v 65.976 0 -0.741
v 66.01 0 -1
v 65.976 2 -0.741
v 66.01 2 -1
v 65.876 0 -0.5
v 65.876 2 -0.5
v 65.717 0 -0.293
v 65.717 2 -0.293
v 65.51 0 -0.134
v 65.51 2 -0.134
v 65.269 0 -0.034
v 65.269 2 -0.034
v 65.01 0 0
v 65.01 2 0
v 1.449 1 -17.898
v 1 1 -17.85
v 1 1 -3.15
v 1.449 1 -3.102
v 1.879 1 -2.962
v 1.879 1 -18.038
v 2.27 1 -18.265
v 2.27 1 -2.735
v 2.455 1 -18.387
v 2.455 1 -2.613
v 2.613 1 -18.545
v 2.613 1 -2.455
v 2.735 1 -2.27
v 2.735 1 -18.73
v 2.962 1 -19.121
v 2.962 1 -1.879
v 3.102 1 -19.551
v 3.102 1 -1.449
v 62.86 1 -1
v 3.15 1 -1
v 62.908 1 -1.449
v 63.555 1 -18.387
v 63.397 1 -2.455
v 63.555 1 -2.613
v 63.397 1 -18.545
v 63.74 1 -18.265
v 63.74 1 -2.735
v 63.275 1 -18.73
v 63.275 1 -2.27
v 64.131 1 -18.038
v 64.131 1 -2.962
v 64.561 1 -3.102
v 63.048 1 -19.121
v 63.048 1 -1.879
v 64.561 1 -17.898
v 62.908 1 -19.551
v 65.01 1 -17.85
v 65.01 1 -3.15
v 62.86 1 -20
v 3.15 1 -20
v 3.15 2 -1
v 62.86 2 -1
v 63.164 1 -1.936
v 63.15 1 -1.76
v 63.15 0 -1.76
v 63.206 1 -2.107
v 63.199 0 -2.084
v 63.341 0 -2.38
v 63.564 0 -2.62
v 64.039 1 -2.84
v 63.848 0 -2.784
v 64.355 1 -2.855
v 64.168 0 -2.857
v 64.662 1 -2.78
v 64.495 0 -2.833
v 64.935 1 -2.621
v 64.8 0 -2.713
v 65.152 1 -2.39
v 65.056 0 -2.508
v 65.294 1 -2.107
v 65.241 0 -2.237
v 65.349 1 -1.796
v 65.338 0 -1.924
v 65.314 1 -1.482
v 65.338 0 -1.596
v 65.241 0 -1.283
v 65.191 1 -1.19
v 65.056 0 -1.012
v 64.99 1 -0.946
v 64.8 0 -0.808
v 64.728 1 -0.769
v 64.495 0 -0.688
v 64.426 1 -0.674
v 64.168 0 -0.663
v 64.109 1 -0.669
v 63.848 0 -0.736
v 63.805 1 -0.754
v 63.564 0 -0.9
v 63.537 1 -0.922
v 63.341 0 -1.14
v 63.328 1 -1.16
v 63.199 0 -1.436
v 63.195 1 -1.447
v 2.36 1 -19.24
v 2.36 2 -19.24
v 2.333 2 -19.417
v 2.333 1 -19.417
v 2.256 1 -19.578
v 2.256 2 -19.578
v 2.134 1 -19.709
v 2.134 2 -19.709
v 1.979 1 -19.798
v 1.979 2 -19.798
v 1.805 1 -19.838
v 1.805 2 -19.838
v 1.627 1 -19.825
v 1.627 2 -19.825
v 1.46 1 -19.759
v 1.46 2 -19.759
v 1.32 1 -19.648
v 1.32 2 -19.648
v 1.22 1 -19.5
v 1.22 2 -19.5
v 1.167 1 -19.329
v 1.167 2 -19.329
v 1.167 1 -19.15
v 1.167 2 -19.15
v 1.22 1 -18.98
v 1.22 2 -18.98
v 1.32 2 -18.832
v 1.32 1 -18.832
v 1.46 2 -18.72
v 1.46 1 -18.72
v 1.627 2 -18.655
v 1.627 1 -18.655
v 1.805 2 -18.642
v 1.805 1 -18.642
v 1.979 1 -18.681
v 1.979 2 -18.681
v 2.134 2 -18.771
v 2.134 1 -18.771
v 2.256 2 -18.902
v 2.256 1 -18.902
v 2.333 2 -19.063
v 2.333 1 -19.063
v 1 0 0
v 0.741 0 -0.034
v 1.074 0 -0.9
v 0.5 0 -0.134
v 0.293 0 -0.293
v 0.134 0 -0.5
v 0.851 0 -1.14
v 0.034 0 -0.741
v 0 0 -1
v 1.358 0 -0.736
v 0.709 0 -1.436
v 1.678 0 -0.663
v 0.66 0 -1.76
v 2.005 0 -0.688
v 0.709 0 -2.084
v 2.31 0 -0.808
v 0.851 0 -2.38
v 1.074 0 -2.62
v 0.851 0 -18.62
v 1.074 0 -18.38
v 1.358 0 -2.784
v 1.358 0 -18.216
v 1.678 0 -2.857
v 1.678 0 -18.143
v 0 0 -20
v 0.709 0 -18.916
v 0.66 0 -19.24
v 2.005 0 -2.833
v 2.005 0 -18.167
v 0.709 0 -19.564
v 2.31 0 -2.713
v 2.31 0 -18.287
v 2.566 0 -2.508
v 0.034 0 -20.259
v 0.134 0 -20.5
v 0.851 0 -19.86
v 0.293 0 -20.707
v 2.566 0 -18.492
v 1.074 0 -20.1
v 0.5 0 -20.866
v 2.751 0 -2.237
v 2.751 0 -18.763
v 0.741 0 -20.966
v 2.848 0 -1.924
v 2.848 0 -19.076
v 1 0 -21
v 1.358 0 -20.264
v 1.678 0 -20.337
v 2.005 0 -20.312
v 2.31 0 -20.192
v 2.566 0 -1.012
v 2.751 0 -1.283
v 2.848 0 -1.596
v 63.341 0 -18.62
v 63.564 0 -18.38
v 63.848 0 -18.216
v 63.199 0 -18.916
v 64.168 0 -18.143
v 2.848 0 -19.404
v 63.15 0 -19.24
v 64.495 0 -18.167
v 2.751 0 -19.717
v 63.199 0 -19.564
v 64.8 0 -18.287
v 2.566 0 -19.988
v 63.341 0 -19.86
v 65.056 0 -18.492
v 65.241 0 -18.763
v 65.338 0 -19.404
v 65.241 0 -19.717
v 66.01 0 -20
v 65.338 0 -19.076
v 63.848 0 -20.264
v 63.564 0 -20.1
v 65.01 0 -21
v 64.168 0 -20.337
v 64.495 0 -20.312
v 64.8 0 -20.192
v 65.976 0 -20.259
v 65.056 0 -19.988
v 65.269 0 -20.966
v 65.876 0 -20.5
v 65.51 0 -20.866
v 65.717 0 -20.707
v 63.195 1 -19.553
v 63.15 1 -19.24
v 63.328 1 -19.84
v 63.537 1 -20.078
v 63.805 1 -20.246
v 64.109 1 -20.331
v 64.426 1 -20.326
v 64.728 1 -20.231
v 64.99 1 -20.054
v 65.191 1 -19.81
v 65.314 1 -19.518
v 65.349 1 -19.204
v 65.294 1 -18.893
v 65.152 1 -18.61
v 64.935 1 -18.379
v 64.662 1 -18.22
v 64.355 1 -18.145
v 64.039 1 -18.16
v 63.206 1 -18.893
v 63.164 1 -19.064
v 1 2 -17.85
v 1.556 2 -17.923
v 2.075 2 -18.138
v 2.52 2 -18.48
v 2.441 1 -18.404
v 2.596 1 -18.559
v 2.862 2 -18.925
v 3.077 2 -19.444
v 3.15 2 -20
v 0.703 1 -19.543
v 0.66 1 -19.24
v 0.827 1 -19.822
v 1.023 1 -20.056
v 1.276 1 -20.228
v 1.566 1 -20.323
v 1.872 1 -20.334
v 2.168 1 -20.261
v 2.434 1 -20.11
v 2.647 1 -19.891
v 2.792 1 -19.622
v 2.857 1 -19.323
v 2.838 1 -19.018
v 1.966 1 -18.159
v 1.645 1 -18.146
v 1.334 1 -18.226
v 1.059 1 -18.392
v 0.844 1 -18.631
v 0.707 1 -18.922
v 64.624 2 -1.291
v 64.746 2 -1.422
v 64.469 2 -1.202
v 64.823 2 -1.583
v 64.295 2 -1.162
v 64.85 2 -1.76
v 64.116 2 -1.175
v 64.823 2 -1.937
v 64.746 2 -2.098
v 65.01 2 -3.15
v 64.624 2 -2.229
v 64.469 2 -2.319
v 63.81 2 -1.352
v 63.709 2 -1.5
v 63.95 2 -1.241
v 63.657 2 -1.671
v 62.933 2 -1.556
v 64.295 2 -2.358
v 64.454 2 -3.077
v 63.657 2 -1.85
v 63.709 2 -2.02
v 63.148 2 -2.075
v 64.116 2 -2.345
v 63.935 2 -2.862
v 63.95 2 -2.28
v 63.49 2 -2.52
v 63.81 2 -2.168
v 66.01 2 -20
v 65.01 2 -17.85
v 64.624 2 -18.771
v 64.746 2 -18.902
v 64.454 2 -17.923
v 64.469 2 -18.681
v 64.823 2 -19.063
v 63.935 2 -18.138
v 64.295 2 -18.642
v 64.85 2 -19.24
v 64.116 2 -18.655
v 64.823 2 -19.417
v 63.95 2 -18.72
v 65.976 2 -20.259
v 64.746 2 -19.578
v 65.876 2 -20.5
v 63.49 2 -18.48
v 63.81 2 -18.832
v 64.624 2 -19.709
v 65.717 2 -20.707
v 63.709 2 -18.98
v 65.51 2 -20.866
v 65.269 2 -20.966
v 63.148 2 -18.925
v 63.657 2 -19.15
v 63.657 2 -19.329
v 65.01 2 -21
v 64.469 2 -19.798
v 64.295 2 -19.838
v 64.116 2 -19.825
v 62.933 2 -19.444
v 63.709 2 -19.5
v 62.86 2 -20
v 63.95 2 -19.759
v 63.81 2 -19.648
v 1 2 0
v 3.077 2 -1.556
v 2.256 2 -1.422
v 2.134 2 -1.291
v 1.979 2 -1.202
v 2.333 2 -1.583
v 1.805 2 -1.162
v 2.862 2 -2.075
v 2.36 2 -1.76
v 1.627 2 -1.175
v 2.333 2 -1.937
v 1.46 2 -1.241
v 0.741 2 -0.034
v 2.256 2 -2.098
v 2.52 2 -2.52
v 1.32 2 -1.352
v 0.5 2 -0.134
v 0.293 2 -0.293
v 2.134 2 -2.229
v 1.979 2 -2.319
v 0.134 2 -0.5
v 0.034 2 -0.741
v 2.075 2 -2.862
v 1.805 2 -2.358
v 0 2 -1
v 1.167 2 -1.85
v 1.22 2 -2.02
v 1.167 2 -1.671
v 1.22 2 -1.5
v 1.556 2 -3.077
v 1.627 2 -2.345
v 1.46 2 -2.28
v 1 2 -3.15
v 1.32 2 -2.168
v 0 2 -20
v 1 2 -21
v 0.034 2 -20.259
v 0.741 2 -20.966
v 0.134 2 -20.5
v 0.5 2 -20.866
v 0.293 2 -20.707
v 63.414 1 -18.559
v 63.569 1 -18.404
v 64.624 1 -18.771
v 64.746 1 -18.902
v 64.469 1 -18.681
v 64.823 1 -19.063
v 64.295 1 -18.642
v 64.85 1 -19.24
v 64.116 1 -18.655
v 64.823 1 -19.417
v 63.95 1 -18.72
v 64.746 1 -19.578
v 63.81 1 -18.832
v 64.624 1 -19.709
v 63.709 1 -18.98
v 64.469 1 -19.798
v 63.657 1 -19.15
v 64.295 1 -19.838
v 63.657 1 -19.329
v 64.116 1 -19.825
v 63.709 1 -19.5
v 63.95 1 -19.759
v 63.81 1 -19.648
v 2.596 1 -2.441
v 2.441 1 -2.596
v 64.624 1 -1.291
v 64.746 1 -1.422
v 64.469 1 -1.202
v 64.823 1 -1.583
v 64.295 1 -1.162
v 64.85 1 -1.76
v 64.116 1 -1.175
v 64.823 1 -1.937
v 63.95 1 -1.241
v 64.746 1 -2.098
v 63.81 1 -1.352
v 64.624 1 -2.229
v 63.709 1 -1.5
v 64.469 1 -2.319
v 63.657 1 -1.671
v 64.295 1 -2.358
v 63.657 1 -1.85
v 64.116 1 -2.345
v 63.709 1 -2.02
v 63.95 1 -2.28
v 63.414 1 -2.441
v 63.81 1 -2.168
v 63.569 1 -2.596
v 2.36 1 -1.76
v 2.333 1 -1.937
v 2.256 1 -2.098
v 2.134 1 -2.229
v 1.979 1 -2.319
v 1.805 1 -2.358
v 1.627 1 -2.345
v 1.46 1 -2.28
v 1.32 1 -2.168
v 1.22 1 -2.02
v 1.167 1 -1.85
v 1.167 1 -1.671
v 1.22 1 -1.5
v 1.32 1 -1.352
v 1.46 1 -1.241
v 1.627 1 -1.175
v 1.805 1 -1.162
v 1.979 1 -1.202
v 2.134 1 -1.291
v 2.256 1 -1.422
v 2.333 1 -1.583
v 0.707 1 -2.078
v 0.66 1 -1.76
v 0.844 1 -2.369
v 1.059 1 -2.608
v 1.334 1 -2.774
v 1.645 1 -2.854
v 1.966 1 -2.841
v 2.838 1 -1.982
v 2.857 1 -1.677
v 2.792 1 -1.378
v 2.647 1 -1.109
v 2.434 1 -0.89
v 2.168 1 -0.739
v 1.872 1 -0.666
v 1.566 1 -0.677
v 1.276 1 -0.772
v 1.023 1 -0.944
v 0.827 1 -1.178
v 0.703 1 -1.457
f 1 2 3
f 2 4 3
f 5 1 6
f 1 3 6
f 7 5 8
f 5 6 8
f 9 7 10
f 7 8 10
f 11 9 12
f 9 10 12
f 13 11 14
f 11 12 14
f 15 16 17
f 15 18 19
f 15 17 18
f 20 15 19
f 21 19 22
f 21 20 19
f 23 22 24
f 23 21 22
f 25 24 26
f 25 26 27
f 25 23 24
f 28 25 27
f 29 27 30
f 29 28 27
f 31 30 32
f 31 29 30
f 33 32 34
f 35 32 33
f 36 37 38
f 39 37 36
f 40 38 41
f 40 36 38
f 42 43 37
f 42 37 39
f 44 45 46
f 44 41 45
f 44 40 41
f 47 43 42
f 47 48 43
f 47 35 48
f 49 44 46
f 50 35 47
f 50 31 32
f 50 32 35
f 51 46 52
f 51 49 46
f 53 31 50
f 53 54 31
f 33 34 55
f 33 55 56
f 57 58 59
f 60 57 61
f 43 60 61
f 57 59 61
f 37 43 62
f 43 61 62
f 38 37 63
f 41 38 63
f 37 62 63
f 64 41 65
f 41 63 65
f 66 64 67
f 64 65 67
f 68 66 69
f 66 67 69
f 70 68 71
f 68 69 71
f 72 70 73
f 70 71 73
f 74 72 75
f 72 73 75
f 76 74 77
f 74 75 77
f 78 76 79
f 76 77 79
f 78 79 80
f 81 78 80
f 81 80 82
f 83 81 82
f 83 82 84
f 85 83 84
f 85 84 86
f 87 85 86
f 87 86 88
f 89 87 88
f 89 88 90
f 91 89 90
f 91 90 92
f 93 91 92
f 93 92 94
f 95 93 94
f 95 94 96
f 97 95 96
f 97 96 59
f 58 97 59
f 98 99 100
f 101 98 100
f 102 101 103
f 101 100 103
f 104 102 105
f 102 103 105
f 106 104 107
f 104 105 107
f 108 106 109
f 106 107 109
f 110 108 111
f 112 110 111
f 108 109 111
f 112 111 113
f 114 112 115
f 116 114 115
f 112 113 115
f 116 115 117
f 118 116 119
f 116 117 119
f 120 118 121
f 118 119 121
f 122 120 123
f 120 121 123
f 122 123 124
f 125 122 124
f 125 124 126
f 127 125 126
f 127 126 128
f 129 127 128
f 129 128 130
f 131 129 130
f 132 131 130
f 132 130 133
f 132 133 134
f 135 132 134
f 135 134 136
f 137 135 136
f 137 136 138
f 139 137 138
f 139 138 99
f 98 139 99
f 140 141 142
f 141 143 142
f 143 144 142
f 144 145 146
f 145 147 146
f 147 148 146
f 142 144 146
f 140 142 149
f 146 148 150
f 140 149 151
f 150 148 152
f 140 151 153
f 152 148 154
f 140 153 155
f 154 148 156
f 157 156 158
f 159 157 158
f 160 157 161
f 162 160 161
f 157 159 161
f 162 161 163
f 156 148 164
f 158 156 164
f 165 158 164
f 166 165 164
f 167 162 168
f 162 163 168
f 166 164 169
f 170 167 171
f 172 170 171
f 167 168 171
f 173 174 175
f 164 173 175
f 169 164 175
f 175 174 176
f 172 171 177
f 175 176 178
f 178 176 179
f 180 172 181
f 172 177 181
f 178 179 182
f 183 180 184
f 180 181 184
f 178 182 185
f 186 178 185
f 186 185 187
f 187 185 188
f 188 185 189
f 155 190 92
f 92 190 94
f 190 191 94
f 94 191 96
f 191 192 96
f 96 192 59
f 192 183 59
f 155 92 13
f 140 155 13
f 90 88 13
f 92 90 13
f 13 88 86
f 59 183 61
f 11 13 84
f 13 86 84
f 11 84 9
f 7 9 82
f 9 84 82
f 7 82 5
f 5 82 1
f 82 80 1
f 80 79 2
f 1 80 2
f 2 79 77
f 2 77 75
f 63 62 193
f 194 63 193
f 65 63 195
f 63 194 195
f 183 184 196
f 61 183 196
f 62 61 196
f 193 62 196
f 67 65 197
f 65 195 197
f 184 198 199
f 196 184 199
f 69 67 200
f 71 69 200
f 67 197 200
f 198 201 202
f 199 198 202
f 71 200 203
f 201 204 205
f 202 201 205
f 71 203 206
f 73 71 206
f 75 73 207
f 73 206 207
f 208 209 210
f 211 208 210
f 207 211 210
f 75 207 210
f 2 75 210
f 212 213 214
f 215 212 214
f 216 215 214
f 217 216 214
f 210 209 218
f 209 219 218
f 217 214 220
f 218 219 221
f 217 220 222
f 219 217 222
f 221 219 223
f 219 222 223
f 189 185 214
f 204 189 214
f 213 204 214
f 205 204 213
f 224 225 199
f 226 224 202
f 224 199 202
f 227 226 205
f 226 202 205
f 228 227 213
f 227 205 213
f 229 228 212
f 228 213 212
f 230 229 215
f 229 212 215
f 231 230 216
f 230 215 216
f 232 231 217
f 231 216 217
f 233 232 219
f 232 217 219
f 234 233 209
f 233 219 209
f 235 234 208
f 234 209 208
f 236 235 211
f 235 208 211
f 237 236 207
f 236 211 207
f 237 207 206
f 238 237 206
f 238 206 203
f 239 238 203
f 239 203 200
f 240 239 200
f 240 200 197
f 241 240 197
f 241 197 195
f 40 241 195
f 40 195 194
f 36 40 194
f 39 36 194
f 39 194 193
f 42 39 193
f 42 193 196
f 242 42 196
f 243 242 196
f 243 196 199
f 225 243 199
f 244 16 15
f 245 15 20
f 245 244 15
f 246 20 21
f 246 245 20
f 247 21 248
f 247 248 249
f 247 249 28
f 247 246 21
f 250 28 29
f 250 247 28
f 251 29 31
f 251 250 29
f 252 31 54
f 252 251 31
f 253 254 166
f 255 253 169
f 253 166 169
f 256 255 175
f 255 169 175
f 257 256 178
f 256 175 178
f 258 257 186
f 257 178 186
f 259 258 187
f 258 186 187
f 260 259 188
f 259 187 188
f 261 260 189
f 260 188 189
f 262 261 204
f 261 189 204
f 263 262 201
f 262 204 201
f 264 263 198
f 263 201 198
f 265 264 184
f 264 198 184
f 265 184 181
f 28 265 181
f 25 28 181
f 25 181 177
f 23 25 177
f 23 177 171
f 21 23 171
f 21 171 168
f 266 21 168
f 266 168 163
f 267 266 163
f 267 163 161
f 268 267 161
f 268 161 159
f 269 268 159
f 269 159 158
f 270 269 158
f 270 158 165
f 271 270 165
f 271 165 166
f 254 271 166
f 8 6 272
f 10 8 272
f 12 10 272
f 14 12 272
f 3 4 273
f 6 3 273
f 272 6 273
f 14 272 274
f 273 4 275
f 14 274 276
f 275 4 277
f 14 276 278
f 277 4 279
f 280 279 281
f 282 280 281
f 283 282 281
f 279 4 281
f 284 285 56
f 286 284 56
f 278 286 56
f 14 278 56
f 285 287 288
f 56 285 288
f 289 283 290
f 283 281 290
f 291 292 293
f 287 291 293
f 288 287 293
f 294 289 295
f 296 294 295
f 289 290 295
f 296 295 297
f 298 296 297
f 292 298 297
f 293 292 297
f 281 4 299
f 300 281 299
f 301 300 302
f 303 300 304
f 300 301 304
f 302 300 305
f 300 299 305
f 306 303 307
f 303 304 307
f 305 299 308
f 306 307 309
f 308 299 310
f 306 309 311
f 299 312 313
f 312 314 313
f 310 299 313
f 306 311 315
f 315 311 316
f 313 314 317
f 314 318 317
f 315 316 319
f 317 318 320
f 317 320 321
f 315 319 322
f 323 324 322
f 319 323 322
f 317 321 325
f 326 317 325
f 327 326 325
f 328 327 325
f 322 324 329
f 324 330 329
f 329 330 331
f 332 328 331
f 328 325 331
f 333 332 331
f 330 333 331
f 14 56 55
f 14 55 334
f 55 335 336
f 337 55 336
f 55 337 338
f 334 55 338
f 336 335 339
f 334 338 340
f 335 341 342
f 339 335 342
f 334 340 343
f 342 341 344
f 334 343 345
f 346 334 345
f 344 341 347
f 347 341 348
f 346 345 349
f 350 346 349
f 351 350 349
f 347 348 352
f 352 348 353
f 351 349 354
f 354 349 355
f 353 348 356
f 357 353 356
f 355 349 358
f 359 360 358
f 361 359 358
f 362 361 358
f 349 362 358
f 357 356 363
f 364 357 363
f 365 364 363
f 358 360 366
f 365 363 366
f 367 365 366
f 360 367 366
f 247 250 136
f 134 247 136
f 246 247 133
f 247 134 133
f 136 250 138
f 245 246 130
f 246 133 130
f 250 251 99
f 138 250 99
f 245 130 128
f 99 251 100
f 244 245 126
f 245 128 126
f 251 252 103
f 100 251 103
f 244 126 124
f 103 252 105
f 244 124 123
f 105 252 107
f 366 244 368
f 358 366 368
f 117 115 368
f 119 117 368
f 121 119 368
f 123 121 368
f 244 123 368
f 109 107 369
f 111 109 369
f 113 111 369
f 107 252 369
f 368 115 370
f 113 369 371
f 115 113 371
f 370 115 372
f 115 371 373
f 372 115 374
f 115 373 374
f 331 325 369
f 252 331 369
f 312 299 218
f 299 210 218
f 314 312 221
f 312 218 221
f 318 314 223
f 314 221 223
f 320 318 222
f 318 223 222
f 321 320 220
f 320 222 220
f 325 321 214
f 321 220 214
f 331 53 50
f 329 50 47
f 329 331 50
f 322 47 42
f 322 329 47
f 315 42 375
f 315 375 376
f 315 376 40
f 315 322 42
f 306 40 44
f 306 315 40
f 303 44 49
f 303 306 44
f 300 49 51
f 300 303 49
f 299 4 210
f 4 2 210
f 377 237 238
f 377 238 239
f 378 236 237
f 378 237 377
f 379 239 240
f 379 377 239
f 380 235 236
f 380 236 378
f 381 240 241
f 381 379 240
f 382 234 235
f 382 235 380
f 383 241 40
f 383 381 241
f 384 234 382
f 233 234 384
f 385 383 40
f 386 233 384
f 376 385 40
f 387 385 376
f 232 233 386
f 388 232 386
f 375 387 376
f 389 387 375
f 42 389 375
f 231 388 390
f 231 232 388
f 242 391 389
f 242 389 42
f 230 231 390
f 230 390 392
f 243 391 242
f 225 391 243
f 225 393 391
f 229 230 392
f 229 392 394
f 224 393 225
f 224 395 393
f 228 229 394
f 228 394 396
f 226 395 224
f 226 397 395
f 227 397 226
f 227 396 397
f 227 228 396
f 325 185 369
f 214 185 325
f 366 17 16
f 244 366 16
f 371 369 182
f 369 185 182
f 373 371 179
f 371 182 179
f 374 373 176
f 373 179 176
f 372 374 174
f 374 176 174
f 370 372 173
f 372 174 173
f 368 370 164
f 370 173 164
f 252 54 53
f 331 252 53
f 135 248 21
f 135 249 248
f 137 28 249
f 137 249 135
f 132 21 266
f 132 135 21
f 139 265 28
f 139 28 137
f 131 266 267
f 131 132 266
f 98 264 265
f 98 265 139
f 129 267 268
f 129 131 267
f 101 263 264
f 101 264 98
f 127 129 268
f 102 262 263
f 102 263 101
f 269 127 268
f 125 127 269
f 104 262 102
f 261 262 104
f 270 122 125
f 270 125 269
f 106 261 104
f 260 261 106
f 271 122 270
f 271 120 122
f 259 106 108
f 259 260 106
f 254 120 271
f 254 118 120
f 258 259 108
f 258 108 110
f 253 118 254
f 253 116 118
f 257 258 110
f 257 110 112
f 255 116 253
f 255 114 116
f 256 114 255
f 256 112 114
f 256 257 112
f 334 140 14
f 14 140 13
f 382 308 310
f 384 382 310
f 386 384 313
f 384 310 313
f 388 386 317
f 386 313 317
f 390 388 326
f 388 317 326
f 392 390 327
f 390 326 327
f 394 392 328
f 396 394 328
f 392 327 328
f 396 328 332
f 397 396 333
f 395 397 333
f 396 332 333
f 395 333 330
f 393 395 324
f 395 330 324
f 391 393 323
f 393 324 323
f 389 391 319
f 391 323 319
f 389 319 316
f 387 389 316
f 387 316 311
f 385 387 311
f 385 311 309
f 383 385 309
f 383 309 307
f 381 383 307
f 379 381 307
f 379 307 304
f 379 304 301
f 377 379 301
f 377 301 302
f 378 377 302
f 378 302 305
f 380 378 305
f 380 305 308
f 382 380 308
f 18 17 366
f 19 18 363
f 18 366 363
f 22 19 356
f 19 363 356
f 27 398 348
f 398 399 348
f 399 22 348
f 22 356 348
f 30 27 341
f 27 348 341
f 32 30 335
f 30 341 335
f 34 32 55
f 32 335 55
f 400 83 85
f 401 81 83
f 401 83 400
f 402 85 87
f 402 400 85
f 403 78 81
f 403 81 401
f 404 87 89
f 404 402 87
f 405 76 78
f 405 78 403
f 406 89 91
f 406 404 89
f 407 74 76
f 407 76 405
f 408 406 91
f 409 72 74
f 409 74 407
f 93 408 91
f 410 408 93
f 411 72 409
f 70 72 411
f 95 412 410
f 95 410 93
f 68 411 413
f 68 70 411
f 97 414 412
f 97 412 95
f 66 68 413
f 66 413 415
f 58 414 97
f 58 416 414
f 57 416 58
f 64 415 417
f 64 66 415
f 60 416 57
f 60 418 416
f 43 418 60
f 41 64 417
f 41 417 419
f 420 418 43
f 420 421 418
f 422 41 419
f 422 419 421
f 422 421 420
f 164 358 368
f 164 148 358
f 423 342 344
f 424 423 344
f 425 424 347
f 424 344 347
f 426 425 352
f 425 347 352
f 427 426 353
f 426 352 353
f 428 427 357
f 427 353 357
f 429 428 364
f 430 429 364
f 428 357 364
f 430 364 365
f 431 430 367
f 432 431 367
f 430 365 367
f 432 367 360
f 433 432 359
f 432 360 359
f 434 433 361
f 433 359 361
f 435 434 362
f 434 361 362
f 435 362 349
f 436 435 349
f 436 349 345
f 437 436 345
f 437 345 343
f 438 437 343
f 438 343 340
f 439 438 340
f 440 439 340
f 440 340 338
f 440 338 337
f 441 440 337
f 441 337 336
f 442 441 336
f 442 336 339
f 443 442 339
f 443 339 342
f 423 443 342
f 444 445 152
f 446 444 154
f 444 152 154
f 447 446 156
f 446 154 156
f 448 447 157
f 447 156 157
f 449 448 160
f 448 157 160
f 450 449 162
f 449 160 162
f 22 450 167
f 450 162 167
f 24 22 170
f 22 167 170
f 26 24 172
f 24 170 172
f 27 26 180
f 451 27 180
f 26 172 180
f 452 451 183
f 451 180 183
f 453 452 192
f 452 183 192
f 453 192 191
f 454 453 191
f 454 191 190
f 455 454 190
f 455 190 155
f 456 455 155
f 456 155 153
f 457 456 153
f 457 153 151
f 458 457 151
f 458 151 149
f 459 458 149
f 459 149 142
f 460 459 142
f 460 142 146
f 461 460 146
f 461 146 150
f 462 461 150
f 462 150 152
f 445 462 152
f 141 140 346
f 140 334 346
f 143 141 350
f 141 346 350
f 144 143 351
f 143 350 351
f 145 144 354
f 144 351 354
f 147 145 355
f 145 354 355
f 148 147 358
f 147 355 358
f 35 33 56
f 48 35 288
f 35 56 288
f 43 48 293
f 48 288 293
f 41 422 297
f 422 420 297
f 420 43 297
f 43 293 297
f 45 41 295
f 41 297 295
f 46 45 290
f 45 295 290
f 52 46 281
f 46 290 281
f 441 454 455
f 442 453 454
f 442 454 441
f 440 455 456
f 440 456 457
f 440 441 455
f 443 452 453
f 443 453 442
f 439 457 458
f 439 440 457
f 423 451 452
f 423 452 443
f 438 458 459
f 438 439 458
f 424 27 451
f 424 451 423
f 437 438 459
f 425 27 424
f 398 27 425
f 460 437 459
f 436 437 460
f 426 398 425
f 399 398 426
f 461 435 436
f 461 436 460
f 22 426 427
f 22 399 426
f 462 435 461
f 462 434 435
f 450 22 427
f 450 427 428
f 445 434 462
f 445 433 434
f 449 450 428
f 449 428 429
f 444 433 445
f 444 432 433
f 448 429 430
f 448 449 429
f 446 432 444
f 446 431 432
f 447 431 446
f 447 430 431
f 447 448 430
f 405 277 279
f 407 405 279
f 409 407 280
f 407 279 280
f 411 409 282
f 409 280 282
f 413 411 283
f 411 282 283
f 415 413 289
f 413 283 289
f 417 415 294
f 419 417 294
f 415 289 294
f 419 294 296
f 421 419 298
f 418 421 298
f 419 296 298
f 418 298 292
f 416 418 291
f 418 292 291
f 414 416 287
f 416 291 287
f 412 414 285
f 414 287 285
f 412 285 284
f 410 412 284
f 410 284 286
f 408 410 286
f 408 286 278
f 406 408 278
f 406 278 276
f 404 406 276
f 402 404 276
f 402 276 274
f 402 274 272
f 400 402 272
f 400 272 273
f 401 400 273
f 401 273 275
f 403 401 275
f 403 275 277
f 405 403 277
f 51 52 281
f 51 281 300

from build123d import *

# Parameters (mm, degrees)
CROQUIS1_W              = 66.01
CROQUIS1_H              = 21
SALIENTE_EXTRUIR1_DEPTH = 1
CROQUIS2_W              = 66.01
CROQUIS2_H              = 21
CROQUIS2_W_2            = 64.01
CROQUIS2_H_2            = 19
SALIENTE_EXTRUIR2_DEPTH = 1
SALIENTE_EXTRUIR3_REACH = 4
CROQUIS5_R              = 0.6
CORTAR_EXTRUIR1_DEPTH   = 3
CROQUIS6_R              = 1.1
CORTAR_EXTRUIR2_DEPTH   = 1
REDONDEO1_R             = 1


with BuildPart() as part:
    # Croquis1 → Saliente-Extruir1 (new body)
    with BuildSketch(Plane(origin=(0, 0, 0), x_dir=(1, 0, 0), z_dir=(0, 1, 0))):
        with Locations((33.005, 10.5)):
            Rectangle(CROQUIS1_W, CROQUIS1_H)
    extrude(amount=SALIENTE_EXTRUIR1_DEPTH)

    # Croquis2 → Saliente-Extruir2 (add)
    with BuildSketch(Plane(origin=(0, 1, 0), x_dir=(1, 0, 0), z_dir=(0, 1, 0))):
        with Locations((33.005, 10.5)):
            Rectangle(CROQUIS2_W, CROQUIS2_H)
        with Locations((33.005, 10.5)):
            Rectangle(CROQUIS2_W_2, CROQUIS2_H_2, mode=Mode.SUBTRACT)
    extrude(amount=SALIENTE_EXTRUIR2_DEPTH)

    # Croquis4 → Saliente-Extruir3 (add, up to next)
    with BuildSketch(Plane(origin=(0, 2, 0), x_dir=(1, 0, 0), z_dir=(0, 1, 0)), mode=Mode.PRIVATE) as saliente_extruir3_sk1:
        with BuildLine():
            Line((1, 20), (1, 17.85))
            ThreePointArc((1, 17.85), (2.52027958, 18.47972042), (3.15, 20))
            Line((3.15, 20), (1, 20))
        make_face()
    saliente_extruir3_tool1 = extrude(saliente_extruir3_sk1.sketch, amount=-SALIENTE_EXTRUIR3_REACH, mode=Mode.PRIVATE) - part.part
    add(saliente_extruir3_tool1.solids().sort_by_distance((1.912488, 2, -19.087512))[0])
    # Croquis4 → Saliente-Extruir3 (add, up to next)
    with BuildSketch(Plane(origin=(0, 2, 0), x_dir=(1, 0, 0), z_dir=(0, 1, 0)), mode=Mode.PRIVATE) as saliente_extruir3_sk2:
        with BuildLine():
            Line((1, 1), (1, 3.15))
            ThreePointArc((1, 3.15), (2.52027958, 2.52027958), (3.15, 1))
            Line((3.15, 1), (1, 1))
        make_face()
    saliente_extruir3_tool2 = extrude(saliente_extruir3_sk2.sketch, amount=-SALIENTE_EXTRUIR3_REACH, mode=Mode.PRIVATE) - part.part
    add(saliente_extruir3_tool2.solids().sort_by_distance((1.912488, 2, -1.912488))[0])
    # Croquis4 → Saliente-Extruir3 (add, up to next)
    with BuildSketch(Plane(origin=(0, 2, 0), x_dir=(1, 0, 0), z_dir=(0, 1, 0)), mode=Mode.PRIVATE) as saliente_extruir3_sk3:
        with BuildLine():
            Line((65.01, 20), (62.86, 20))
            ThreePointArc((62.86, 20), (63.48972042, 18.47972042), (65.01, 17.85))
            Line((65.01, 17.85), (65.01, 20))
        make_face()
    saliente_extruir3_tool3 = extrude(saliente_extruir3_sk3.sketch, amount=-SALIENTE_EXTRUIR3_REACH, mode=Mode.PRIVATE) - part.part
    add(saliente_extruir3_tool3.solids().sort_by_distance((64.097512, 2, -19.087512))[0])
    # Croquis4 → Saliente-Extruir3 (add, up to next)
    with BuildSketch(Plane(origin=(0, 2, 0), x_dir=(1, 0, 0), z_dir=(0, 1, 0)), mode=Mode.PRIVATE) as saliente_extruir3_sk4:
        with BuildLine():
            Line((65.01, 1), (62.86, 1))
            ThreePointArc((62.86, 1), (63.48972042, 2.52027958), (65.01, 3.15))
            Line((65.01, 3.15), (65.01, 1))
        make_face()
    saliente_extruir3_tool4 = extrude(saliente_extruir3_sk4.sketch, amount=-SALIENTE_EXTRUIR3_REACH, mode=Mode.PRIVATE) - part.part
    add(saliente_extruir3_tool4.solids().sort_by_distance((64.097512, 2, -1.912488))[0])

    # Croquis5 → Cortar-Extruir1 (cut, through all)
    with BuildSketch(Plane(origin=(0, 2, 0), x_dir=(1, 0, 0), z_dir=(0, 1, 0))):
        with Locations((1.76013979, 19.23986021)):
            Circle(CROQUIS5_R)
        with Locations((1.76013979, 1.76013979)):
            Circle(CROQUIS5_R)
        with Locations((64.24986021, 19.23986021)):
            Circle(CROQUIS5_R)
        with Locations((64.24986021, 1.76013979)):
            Circle(CROQUIS5_R)
    extrude(amount=-CORTAR_EXTRUIR1_DEPTH, mode=Mode.SUBTRACT)

    # Croquis6 → Cortar-Extruir2 (cut)
    with BuildSketch(Plane(origin=(0, 0, 0), x_dir=(-1, 0, 0), z_dir=(0, -1, 0))):
        with Locations((-64.24986021, 1.76013979)):
            Circle(CROQUIS6_R)
        with Locations((-64.24986021, 19.23986021)):
            Circle(CROQUIS6_R)
        with Locations((-1.76013979, 19.23986021)):
            Circle(CROQUIS6_R)
        with Locations((-1.76013979, 1.76013979)):
            Circle(CROQUIS6_R)
    extrude(amount=-CORTAR_EXTRUIR2_DEPTH, mode=Mode.SUBTRACT)

    # Redondeo1
    redondeo1_edges = [part.edges().sort_by_distance(p)[0] for p in [
        (0, 1, -21),
        (66.01, 1, -21),
        (66.01, 1, 0),
        (0, 1, 0),
    ]]
    fillet(redondeo1_edges, radius=REDONDEO1_R)


solid = part.part
